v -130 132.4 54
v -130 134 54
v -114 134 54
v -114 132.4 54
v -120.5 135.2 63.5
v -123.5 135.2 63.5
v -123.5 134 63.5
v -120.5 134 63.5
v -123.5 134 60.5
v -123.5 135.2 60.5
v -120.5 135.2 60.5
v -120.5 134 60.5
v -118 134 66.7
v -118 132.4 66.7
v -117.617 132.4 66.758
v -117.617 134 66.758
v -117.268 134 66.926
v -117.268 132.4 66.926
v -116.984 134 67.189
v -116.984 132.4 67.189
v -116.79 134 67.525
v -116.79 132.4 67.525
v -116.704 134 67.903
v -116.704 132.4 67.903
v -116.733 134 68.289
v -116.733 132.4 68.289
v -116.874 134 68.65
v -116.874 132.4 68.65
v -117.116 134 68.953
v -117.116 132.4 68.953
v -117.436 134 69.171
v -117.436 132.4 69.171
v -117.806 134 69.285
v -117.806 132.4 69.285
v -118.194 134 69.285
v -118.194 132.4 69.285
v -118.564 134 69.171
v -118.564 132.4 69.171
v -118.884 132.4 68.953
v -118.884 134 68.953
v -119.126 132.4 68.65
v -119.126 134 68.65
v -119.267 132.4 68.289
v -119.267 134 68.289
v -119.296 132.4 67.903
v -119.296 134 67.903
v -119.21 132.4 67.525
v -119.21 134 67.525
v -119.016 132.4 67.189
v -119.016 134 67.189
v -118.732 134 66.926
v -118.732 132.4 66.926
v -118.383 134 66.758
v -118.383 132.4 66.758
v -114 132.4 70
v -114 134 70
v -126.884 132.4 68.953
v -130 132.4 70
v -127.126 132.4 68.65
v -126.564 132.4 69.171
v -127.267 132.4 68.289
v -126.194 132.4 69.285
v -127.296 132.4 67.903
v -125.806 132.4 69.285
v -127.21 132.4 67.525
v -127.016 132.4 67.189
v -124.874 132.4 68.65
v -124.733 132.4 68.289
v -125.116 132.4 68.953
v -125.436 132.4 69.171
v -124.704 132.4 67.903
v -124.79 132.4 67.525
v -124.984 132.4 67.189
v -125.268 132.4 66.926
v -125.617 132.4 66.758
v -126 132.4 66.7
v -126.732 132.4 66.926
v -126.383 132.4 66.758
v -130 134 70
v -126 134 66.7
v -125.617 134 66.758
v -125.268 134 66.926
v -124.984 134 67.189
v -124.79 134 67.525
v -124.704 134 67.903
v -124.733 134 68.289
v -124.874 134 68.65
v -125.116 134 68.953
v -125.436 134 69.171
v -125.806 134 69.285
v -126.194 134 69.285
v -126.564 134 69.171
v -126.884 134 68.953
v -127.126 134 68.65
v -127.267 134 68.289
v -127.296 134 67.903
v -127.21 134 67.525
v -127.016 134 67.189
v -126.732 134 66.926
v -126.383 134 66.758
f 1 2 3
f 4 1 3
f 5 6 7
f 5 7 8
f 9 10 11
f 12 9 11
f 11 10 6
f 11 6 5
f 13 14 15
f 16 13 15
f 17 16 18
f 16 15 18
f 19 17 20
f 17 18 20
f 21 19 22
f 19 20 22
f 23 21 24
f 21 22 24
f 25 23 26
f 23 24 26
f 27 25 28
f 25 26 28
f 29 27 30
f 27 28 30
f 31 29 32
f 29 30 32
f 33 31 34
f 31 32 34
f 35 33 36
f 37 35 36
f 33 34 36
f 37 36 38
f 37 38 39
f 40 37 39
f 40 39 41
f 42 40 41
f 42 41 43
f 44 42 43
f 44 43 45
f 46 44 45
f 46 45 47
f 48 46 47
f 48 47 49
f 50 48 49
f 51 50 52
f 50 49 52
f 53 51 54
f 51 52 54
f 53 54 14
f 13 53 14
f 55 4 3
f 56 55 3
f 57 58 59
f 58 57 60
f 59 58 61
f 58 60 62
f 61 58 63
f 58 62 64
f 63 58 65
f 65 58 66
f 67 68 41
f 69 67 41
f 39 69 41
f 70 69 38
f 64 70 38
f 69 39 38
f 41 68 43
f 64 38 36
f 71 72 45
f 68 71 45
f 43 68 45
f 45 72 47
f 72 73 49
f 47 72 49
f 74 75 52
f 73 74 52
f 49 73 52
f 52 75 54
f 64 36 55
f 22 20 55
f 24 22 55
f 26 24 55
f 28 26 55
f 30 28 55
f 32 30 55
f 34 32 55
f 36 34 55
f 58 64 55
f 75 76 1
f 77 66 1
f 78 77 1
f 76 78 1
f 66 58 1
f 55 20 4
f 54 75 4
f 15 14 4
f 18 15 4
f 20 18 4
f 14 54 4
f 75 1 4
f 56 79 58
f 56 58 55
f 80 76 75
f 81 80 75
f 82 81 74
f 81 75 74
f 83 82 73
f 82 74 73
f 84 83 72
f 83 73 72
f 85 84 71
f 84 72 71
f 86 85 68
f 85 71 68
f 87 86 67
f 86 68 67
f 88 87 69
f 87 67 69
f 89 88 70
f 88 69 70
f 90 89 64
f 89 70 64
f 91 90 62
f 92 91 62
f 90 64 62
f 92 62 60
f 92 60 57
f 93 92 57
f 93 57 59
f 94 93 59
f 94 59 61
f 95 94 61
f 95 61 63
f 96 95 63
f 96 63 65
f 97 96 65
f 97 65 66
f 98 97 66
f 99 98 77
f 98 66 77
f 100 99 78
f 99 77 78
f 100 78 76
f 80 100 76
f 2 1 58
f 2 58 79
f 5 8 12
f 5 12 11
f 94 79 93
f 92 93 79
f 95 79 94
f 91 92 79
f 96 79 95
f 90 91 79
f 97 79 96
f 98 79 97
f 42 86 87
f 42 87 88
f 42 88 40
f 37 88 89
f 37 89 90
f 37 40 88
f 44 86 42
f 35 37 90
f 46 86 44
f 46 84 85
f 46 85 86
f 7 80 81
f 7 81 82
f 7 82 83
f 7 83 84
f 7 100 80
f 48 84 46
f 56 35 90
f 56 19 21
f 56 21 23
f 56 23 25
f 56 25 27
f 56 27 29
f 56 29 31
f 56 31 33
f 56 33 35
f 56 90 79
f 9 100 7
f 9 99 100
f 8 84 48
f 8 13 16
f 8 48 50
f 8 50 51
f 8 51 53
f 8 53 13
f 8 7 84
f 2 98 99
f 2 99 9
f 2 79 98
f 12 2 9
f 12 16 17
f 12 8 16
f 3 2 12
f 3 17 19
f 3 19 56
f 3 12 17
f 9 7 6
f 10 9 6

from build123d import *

# Parameters (mm, degrees)
V10_SHT_CANDIDATE_CARRIER16X16_START   = 54
SKETCH_2_W                             = 16
SKETCH_2_H                             = 1.6
V10_SHT_CANDIDATE_CARRIER16X16_DEPTH   = 16
V10_SHT_SENSING_PACKAGE_REARWARD_START = 60.5
SKETCH_3_W                             = 3
SKETCH_3_H                             = 1.2
V10_SHT_SENSING_PACKAGE_REARWARD_DEPTH = 3
SKETCH_4_R                             = 1.3
V10_SHT_TWO_CANDIDATE_HOLES8MM_DEPTH   = 1.6


with BuildPart() as part:
    # 草图2 → V10_SHT_candidate_carrier16x16 (new body)
    with BuildSketch(Plane.XY.offset(V10_SHT_CANDIDATE_CARRIER16X16_START)):
        with Locations((-122, 133.2)):
            Rectangle(SKETCH_2_W, SKETCH_2_H)
    extrude(amount=V10_SHT_CANDIDATE_CARRIER16X16_DEPTH)

    # 草图3 → V10_SHT_sensing_package_rearward (add)
    with BuildSketch(Plane.XY.offset(V10_SHT_SENSING_PACKAGE_REARWARD_START)):
        with Locations((-122, 134.6)):
            Rectangle(SKETCH_3_W, SKETCH_3_H)
    extrude(amount=V10_SHT_SENSING_PACKAGE_REARWARD_DEPTH)

    # 草图4 → V10_SHT_two_candidate_holes8mm (cut)
    with BuildSketch(Plane.XZ.offset(-132.4)):
        with Locations((-126, 68)):
            Circle(SKETCH_4_R)
        with Locations((-118, 68)):
            Circle(SKETCH_4_R)
    extrude(amount=-V10_SHT_TWO_CANDIDATE_HOLES8MM_DEPTH, mode=Mode.SUBTRACT)


solid = part.part
